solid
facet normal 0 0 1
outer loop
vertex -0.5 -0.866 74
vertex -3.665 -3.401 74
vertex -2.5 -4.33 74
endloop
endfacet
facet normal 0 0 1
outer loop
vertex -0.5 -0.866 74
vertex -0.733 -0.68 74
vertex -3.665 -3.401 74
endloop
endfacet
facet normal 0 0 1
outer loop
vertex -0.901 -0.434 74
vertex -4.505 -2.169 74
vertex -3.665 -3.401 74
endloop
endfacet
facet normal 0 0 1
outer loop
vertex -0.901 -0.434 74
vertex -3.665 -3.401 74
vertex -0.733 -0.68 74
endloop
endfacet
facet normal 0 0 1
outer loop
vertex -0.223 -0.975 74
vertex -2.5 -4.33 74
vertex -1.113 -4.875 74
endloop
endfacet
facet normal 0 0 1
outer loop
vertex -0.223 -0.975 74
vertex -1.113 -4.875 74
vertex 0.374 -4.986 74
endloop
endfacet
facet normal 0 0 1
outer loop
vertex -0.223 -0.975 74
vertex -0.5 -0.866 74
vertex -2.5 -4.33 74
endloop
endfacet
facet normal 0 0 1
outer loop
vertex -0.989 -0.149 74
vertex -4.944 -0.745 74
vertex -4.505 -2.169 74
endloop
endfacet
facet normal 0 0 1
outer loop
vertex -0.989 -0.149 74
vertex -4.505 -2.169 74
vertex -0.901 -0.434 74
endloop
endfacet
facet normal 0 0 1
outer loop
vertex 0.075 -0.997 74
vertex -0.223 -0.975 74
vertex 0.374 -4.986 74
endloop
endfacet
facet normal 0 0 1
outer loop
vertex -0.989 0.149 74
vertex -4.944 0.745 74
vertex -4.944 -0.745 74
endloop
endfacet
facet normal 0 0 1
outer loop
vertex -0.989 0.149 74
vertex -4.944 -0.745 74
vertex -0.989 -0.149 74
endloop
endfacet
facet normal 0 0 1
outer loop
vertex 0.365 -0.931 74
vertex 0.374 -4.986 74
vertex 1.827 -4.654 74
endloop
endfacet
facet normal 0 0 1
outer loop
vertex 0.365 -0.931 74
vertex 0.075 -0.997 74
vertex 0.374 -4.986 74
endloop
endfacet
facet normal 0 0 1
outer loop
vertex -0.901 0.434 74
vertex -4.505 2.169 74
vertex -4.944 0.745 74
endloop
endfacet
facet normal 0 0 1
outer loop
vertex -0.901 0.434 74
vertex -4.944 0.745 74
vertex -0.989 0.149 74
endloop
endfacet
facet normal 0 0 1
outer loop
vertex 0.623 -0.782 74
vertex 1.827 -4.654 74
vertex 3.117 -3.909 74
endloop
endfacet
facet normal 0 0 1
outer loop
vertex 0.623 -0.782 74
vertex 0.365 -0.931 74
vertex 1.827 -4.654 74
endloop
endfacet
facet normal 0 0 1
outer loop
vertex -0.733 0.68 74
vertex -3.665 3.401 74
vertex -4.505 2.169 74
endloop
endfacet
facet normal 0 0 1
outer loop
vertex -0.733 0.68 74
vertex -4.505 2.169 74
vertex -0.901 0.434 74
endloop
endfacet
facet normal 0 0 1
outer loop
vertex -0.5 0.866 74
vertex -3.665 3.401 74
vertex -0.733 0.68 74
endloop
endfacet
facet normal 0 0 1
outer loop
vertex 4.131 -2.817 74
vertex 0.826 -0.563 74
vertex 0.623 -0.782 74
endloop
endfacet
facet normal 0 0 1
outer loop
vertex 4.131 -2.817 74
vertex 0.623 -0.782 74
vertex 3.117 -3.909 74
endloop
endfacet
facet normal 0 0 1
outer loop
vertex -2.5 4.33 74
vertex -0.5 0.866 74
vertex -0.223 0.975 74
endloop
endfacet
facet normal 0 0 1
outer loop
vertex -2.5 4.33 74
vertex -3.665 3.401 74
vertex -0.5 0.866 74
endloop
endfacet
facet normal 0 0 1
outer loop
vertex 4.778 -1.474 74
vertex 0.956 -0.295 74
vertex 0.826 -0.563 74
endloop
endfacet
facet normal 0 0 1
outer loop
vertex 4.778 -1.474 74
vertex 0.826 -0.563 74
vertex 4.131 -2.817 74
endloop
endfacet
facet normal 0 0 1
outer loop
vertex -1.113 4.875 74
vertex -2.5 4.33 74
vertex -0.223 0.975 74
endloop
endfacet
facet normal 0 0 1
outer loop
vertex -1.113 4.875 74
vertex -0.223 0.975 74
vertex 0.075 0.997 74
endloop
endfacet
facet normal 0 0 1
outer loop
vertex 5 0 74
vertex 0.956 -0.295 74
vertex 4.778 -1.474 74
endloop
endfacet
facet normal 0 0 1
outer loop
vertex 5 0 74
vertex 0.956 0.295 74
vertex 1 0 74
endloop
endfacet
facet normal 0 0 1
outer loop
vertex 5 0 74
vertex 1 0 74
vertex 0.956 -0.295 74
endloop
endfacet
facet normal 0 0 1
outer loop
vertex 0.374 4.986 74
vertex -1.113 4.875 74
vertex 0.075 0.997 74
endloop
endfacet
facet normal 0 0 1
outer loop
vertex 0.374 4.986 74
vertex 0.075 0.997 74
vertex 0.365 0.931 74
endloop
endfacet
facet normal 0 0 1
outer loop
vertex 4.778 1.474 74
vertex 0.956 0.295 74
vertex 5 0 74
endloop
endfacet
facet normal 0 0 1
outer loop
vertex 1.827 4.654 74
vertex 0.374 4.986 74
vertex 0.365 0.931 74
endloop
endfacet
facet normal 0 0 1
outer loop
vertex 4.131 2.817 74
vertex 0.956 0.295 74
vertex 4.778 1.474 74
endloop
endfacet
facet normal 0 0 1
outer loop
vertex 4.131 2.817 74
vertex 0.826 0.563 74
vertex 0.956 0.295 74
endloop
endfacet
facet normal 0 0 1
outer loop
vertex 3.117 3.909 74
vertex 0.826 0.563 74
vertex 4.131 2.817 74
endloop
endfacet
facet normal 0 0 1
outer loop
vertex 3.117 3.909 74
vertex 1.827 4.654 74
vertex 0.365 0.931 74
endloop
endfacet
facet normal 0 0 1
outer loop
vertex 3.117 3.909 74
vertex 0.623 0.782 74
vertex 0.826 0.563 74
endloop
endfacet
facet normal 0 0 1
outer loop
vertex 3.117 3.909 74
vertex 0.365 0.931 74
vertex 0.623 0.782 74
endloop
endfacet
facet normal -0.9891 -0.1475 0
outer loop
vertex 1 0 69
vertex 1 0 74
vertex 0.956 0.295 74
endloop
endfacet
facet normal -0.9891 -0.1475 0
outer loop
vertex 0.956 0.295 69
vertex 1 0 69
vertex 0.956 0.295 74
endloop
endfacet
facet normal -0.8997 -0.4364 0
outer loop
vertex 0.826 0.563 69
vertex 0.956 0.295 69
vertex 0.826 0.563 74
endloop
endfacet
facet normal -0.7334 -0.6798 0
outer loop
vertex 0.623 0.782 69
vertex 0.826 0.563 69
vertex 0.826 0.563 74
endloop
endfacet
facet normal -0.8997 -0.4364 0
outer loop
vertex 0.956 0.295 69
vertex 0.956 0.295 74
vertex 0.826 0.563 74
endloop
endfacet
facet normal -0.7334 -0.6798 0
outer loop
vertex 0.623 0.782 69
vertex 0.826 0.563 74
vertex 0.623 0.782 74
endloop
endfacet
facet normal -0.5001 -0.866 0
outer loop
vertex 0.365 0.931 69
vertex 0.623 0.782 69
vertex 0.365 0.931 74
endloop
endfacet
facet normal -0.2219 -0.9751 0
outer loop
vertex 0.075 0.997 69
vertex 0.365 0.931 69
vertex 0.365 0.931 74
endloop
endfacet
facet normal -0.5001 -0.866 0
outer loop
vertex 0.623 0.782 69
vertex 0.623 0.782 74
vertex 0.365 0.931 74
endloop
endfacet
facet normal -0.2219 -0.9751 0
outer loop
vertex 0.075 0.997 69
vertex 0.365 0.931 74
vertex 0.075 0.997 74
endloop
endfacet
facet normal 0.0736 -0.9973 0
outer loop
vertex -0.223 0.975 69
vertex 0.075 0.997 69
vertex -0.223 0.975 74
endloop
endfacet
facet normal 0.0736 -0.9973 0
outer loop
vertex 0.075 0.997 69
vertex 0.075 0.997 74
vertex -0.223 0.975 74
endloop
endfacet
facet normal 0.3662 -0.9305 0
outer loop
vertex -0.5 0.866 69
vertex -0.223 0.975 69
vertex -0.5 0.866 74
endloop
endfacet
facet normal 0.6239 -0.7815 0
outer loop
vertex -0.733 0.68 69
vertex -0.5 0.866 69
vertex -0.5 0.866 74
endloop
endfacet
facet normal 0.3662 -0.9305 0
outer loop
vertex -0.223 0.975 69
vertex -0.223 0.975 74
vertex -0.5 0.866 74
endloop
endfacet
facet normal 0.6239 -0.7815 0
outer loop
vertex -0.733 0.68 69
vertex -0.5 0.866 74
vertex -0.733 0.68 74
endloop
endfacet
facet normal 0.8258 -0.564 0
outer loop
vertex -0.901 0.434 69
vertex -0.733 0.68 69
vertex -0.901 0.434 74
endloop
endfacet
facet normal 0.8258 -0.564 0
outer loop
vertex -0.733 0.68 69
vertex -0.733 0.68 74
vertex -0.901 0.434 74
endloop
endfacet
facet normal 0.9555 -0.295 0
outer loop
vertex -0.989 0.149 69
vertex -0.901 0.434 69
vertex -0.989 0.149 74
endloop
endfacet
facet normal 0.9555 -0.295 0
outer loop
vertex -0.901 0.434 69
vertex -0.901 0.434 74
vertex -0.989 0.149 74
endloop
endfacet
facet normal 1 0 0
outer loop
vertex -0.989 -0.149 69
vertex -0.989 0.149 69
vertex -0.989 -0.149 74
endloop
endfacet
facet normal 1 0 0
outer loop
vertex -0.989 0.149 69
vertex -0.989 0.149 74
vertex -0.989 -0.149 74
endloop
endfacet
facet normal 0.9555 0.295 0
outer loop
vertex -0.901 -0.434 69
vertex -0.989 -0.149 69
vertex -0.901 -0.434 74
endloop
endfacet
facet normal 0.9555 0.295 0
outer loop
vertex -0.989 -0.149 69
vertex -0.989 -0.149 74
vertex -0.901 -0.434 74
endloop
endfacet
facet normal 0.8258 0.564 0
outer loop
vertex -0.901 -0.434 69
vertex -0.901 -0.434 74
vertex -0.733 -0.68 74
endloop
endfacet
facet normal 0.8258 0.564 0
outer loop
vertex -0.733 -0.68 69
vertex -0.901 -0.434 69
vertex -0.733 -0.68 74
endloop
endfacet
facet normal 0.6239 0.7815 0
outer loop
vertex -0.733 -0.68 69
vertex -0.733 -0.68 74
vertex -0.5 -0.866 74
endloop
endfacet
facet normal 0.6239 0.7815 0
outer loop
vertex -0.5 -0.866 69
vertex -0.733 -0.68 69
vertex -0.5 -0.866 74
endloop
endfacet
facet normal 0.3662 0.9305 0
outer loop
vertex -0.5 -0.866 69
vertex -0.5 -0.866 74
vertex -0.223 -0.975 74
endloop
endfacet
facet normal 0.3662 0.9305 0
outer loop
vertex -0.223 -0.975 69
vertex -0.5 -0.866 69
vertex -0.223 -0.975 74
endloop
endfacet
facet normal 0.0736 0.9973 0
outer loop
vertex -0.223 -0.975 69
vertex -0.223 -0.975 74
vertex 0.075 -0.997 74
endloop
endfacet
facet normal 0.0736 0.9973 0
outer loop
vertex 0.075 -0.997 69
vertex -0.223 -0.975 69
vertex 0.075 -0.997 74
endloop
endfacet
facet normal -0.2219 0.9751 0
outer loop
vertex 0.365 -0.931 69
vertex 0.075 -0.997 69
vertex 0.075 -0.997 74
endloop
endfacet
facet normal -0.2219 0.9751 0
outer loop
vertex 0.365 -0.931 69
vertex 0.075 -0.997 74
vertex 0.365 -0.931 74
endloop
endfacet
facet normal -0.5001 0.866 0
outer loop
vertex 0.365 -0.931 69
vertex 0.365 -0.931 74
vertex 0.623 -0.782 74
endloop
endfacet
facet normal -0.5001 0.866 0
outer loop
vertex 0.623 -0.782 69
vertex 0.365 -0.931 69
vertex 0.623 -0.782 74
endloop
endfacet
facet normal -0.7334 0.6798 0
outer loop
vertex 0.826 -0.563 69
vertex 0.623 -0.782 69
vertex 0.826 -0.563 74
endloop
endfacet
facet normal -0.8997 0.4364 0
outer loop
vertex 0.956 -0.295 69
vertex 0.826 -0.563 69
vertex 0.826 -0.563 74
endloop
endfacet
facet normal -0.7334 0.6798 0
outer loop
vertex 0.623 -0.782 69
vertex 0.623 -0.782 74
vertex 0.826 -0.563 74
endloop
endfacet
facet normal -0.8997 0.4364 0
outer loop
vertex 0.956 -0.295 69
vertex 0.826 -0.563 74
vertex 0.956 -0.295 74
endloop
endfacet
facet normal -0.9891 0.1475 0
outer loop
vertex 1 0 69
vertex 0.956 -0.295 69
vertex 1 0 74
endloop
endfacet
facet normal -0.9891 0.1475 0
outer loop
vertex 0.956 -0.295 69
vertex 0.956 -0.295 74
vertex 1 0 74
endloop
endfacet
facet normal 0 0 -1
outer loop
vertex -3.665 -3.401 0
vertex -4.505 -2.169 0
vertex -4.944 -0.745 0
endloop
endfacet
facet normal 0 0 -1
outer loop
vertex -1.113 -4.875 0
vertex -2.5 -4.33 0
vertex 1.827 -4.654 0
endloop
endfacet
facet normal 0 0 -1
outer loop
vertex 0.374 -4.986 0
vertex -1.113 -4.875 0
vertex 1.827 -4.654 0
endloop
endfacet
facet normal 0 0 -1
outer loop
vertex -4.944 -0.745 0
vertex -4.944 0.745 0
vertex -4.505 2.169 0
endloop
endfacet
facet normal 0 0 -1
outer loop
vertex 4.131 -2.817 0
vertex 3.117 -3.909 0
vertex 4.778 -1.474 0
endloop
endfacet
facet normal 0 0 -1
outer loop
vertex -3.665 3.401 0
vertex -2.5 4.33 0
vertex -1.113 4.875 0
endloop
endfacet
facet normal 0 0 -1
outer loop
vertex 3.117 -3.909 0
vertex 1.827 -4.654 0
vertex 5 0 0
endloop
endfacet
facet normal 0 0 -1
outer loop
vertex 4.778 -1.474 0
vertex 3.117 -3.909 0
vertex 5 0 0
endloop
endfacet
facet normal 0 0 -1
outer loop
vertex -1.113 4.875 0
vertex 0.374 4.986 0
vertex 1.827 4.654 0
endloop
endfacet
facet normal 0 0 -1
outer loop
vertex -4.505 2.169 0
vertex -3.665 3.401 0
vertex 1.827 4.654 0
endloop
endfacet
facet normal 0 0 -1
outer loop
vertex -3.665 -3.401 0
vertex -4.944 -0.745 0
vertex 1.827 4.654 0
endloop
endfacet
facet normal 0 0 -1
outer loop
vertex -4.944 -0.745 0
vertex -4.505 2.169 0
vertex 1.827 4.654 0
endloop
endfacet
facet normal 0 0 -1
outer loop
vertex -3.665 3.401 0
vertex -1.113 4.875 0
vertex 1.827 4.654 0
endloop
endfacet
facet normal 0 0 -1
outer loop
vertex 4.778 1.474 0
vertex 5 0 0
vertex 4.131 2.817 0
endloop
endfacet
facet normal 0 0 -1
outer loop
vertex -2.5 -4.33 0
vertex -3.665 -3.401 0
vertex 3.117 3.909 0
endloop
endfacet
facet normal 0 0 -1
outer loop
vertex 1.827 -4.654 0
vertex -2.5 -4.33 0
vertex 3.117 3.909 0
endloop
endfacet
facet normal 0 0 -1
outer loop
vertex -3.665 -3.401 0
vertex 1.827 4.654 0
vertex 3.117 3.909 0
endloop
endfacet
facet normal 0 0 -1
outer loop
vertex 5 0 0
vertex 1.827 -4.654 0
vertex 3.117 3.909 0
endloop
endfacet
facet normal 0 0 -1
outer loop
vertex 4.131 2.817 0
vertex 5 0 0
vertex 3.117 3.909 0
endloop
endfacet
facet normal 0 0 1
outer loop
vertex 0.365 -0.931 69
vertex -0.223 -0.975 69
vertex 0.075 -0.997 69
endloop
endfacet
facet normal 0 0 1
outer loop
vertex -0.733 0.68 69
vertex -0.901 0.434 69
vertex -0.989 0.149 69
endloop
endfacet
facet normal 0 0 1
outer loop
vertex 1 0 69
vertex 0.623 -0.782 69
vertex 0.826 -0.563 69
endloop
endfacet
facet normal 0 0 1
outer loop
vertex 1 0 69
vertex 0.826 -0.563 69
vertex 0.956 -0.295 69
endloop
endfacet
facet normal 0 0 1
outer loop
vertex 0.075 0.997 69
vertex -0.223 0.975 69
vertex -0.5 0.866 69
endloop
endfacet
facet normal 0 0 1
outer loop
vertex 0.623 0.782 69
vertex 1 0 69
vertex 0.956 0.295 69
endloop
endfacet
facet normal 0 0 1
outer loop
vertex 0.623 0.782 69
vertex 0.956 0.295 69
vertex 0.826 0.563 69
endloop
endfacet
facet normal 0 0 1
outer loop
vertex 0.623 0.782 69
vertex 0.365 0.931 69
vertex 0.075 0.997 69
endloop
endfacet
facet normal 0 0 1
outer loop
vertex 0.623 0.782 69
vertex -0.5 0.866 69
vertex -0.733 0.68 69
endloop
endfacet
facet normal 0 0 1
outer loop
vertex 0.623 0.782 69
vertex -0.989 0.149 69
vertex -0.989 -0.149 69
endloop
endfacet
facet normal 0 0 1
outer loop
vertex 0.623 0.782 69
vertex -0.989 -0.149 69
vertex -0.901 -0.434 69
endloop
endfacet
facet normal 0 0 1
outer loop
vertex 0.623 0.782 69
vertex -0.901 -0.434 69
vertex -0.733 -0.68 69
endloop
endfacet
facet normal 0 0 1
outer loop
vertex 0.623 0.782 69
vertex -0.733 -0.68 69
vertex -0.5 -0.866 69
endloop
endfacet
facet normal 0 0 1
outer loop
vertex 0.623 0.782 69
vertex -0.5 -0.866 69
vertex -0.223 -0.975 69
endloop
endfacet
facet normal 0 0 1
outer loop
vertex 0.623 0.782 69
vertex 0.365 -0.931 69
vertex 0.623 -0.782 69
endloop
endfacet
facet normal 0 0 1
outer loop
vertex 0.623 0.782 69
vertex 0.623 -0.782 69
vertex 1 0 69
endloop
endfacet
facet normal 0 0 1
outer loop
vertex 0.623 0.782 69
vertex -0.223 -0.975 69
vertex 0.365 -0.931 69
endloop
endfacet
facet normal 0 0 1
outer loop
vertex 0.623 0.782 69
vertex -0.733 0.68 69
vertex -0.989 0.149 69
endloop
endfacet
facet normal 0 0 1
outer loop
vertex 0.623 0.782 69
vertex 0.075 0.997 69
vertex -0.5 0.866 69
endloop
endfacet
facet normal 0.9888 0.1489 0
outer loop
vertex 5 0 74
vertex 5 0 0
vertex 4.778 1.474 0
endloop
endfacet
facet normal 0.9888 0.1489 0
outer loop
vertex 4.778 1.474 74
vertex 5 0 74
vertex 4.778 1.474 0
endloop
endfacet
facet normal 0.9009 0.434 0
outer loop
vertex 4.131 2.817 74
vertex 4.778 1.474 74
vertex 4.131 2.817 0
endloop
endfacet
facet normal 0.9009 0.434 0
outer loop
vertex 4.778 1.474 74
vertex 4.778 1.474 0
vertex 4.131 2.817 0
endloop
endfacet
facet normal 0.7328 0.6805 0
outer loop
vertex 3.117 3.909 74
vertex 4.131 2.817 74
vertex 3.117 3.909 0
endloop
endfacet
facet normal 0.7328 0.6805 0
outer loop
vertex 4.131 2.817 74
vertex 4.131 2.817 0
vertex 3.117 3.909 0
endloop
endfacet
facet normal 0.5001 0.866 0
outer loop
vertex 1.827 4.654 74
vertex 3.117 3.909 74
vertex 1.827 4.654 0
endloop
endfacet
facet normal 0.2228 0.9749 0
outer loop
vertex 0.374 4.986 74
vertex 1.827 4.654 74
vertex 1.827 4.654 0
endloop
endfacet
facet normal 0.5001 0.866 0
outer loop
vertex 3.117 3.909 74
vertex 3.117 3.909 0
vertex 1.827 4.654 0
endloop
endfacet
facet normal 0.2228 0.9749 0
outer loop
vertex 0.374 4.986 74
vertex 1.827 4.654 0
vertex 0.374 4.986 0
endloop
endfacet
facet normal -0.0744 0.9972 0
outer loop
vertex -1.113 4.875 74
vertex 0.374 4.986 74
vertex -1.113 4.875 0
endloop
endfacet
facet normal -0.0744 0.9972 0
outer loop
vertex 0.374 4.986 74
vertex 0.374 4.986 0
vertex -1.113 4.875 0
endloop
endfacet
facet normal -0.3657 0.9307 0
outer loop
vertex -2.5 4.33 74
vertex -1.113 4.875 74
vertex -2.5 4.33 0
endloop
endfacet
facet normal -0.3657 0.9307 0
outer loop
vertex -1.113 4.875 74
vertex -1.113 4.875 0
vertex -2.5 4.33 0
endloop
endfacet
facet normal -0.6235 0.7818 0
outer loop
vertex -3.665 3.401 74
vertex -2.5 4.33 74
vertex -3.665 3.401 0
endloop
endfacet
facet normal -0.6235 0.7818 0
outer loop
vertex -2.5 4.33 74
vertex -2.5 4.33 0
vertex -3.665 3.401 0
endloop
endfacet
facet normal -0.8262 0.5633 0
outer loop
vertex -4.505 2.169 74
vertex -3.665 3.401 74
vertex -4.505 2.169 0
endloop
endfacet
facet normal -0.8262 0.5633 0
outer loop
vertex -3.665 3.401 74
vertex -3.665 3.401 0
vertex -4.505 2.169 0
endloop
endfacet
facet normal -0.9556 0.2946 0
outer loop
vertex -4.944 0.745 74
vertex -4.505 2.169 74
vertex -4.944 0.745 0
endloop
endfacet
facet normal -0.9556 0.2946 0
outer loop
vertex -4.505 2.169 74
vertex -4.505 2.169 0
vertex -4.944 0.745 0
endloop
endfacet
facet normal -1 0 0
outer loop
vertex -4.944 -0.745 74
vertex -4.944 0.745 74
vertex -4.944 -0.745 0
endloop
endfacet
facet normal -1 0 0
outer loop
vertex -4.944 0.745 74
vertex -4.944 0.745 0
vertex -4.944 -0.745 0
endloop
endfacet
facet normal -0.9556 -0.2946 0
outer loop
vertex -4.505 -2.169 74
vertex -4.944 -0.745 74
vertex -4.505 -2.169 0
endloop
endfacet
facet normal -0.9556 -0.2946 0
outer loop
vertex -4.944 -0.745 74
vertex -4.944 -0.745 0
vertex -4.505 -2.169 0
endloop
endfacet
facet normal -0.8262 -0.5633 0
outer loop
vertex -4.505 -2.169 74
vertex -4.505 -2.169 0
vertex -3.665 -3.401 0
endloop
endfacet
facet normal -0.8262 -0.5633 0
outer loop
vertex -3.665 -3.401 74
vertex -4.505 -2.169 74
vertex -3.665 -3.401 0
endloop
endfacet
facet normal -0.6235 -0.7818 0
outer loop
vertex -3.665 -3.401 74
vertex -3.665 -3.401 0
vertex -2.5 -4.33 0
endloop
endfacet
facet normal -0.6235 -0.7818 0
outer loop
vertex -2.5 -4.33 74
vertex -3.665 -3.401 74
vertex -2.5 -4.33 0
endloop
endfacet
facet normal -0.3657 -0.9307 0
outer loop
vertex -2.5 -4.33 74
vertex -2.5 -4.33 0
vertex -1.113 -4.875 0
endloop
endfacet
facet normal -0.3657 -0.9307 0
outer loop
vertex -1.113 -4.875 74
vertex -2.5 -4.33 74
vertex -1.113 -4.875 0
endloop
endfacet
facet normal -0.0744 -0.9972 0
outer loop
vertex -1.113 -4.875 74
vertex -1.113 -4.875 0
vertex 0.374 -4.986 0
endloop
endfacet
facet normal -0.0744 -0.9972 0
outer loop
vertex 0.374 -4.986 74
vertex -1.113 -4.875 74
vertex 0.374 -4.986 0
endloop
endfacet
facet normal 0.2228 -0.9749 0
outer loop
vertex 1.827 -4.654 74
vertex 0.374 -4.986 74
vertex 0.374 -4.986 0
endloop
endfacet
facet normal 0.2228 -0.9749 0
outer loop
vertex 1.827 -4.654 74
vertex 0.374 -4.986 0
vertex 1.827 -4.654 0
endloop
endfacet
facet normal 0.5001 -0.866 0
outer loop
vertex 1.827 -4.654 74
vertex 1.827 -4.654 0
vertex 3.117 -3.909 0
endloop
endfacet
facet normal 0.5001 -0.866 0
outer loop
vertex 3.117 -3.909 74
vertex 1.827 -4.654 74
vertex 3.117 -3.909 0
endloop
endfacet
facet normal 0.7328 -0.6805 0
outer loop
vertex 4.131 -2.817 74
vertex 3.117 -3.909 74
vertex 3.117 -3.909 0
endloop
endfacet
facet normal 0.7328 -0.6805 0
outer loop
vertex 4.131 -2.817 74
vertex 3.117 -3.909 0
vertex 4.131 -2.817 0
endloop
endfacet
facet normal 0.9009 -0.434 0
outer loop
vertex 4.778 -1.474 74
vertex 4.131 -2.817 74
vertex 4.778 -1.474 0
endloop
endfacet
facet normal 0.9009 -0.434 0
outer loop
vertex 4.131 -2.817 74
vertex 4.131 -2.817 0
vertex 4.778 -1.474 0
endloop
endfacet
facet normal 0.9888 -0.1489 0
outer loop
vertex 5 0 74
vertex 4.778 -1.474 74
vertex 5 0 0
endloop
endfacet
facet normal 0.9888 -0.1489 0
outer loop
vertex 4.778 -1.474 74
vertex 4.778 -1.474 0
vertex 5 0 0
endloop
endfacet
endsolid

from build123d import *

# Parameters (mm, degrees)
SKETCH009_R     = 5
PAD006_DEPTH    = 74
SKETCH010_R     = 1
POCKET002_DEPTH = 5
SKETCH011_R     = 1
POCKET003_DEPTH = 5


with BuildPart() as part:
    # Sketch009 → Pad006 (new body)
    with BuildSketch(Plane.XY):
        Circle(SKETCH009_R)
    extrude(amount=PAD006_DEPTH)

    # Sketch010 → Pocket002 (cut)
    with BuildSketch(Plane.XY):
        Circle(SKETCH010_R)
    extrude(amount=-POCKET002_DEPTH, mode=Mode.SUBTRACT)

    # Sketch011 (on Face4 of Pocket002) → Pocket003 (cut)
    with BuildSketch(Plane.XY.offset(74)):
        Circle(SKETCH011_R)
    extrude(amount=-POCKET003_DEPTH, mode=Mode.SUBTRACT)


solid = part.part
